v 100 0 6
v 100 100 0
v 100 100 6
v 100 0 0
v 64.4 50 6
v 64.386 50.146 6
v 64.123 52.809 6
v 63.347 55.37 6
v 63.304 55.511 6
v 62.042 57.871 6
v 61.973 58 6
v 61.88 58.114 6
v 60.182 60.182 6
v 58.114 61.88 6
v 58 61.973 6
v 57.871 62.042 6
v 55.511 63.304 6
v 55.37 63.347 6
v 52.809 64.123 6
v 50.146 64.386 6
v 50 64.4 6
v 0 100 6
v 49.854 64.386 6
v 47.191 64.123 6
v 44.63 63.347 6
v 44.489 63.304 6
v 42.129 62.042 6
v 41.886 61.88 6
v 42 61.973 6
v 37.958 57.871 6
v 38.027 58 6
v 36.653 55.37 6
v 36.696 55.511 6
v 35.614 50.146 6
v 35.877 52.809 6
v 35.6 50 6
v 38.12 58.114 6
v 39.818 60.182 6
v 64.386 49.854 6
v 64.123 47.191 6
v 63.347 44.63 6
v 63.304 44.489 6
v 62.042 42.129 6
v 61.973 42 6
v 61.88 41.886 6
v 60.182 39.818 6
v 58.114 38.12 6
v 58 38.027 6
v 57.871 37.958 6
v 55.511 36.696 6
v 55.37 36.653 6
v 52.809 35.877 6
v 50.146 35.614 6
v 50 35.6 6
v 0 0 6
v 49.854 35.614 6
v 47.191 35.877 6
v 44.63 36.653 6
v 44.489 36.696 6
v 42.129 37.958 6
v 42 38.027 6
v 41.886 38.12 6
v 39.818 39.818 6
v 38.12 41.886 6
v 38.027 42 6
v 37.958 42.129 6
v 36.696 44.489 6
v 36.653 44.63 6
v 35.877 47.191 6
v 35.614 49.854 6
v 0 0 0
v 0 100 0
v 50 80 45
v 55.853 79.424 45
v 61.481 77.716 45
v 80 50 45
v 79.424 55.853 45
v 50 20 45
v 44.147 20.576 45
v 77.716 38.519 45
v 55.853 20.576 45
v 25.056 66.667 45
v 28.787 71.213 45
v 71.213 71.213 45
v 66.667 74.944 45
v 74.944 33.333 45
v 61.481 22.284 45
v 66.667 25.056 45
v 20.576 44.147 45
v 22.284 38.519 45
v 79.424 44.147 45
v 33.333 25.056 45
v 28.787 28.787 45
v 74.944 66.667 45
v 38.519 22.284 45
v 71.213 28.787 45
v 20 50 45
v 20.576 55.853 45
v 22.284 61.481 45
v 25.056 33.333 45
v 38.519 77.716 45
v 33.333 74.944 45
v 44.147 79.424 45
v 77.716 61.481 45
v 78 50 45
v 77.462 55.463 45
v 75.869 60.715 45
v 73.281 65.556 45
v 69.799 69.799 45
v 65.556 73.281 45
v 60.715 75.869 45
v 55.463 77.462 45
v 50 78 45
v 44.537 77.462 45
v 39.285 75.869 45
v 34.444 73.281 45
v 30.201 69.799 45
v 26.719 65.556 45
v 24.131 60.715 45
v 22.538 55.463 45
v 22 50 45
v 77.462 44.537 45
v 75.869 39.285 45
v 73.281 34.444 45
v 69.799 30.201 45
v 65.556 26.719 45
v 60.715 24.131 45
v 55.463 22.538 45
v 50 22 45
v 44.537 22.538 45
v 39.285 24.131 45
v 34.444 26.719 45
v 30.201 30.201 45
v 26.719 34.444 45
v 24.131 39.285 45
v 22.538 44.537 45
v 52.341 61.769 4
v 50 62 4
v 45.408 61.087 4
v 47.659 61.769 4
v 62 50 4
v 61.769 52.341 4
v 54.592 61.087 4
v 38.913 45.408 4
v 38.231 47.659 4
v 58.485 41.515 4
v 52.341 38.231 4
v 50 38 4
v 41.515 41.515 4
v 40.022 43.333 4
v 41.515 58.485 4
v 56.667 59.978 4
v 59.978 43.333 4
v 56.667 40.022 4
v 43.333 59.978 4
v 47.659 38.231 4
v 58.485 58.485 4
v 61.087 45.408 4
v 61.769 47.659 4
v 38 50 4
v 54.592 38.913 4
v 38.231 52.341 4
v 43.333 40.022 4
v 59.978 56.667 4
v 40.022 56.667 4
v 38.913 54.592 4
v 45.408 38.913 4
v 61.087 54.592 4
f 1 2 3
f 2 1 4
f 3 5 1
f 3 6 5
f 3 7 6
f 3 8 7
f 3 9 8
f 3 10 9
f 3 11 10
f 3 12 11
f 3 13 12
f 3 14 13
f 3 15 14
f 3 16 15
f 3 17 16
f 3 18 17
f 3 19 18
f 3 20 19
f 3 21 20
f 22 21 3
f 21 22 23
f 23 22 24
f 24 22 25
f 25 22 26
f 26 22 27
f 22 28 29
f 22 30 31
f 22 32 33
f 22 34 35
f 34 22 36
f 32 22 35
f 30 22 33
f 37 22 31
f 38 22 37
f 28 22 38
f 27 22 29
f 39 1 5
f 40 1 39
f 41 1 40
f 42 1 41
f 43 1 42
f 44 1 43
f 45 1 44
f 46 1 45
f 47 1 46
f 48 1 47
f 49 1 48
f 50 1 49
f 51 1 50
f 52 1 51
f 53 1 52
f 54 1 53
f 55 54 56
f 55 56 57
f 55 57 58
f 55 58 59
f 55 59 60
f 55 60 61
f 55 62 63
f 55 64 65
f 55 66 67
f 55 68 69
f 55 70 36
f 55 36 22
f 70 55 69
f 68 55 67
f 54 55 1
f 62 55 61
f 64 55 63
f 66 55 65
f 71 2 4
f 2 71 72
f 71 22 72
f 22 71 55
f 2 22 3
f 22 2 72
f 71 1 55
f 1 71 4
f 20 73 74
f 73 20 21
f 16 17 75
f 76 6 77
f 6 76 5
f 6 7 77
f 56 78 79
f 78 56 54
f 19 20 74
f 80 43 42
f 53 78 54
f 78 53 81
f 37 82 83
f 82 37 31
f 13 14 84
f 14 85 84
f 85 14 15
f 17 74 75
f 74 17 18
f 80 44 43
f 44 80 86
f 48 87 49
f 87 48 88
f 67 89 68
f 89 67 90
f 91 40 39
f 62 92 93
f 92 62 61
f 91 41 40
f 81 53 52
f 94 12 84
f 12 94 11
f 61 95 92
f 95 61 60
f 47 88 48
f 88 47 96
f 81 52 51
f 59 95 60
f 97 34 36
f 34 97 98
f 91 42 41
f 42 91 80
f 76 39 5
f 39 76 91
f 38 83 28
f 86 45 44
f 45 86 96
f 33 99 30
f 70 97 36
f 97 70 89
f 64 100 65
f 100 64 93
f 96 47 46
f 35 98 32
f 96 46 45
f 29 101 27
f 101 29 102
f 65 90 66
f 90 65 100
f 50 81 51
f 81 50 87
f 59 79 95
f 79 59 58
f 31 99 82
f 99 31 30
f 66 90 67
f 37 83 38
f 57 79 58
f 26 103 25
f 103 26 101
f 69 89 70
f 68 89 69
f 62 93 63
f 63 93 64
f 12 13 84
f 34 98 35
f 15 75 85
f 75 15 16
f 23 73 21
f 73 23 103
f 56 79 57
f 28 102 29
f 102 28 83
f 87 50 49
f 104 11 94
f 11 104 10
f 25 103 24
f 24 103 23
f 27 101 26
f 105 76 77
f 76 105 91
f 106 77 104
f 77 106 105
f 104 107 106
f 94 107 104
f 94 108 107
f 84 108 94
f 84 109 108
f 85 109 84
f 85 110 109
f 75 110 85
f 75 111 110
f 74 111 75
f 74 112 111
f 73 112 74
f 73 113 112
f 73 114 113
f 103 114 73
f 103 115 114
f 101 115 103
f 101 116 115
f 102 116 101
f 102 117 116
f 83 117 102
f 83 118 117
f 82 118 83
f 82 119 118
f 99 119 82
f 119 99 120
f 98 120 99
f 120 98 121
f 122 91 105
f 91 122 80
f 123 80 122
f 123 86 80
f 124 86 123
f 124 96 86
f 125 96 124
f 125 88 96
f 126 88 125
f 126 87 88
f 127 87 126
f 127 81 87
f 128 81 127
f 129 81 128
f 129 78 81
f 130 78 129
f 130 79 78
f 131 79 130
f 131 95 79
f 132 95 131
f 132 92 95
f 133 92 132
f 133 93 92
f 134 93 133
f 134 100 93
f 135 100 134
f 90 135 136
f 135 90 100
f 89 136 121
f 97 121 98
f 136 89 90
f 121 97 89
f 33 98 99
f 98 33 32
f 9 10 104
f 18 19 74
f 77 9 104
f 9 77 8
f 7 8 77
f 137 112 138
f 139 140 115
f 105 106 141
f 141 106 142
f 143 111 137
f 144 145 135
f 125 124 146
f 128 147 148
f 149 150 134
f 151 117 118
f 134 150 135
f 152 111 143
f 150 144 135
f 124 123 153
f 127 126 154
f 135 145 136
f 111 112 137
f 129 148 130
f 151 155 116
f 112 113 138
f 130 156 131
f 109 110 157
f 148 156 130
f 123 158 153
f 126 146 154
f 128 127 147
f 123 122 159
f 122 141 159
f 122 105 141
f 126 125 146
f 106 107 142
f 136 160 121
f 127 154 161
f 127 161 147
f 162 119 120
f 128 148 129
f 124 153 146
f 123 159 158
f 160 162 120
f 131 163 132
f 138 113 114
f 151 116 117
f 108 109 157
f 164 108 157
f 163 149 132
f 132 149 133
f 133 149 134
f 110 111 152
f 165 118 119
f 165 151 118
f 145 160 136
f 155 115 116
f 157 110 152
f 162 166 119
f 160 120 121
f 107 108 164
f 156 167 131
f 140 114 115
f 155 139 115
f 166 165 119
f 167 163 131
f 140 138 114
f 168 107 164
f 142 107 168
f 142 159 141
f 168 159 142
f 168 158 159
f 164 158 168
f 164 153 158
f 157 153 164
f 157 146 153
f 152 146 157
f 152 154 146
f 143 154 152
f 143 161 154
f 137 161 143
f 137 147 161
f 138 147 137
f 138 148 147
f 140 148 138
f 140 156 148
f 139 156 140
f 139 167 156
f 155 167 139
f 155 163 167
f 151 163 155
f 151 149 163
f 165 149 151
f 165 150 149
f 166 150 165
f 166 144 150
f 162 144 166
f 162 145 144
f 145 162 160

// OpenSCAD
$fn = 32;

// ----------------------------------------------------------------------
// Hopper: funnel with square flange
// ----------------------------------------------------------------------

// --- parameters (mm) ---
fl = 100;                 // flange side, X and Y
fl_t = 6;                 // flange thickness
cone_h = 40;              // cone height above the flange
top_d = 60;               // cone mouth diameter
bot_d = 28;               // cone spout diameter
wall = 2;                 // cone wall thickness
fit_tol = 0.1;            // tolerance for press fits, mm
free_tol = 0.5;           // tolerance for clearance fits, mm

bore_d = bot_d - 2 * wall;  // spout bore diameter
total_h = fl_t + cone_h - 1;  // overall height

difference() {
  union() {
    cube([fl, fl, fl_t]);
    translate([fl / 2, fl / 2, fl_t - 1])
      cylinder(h = cone_h, d1 = bot_d, d2 = top_d);
  }
  translate([fl / 2, fl / 2, fl_t - 2])
    cylinder(h = cone_h + 1, d1 = bore_d, d2 = top_d - 2 * wall);
}
